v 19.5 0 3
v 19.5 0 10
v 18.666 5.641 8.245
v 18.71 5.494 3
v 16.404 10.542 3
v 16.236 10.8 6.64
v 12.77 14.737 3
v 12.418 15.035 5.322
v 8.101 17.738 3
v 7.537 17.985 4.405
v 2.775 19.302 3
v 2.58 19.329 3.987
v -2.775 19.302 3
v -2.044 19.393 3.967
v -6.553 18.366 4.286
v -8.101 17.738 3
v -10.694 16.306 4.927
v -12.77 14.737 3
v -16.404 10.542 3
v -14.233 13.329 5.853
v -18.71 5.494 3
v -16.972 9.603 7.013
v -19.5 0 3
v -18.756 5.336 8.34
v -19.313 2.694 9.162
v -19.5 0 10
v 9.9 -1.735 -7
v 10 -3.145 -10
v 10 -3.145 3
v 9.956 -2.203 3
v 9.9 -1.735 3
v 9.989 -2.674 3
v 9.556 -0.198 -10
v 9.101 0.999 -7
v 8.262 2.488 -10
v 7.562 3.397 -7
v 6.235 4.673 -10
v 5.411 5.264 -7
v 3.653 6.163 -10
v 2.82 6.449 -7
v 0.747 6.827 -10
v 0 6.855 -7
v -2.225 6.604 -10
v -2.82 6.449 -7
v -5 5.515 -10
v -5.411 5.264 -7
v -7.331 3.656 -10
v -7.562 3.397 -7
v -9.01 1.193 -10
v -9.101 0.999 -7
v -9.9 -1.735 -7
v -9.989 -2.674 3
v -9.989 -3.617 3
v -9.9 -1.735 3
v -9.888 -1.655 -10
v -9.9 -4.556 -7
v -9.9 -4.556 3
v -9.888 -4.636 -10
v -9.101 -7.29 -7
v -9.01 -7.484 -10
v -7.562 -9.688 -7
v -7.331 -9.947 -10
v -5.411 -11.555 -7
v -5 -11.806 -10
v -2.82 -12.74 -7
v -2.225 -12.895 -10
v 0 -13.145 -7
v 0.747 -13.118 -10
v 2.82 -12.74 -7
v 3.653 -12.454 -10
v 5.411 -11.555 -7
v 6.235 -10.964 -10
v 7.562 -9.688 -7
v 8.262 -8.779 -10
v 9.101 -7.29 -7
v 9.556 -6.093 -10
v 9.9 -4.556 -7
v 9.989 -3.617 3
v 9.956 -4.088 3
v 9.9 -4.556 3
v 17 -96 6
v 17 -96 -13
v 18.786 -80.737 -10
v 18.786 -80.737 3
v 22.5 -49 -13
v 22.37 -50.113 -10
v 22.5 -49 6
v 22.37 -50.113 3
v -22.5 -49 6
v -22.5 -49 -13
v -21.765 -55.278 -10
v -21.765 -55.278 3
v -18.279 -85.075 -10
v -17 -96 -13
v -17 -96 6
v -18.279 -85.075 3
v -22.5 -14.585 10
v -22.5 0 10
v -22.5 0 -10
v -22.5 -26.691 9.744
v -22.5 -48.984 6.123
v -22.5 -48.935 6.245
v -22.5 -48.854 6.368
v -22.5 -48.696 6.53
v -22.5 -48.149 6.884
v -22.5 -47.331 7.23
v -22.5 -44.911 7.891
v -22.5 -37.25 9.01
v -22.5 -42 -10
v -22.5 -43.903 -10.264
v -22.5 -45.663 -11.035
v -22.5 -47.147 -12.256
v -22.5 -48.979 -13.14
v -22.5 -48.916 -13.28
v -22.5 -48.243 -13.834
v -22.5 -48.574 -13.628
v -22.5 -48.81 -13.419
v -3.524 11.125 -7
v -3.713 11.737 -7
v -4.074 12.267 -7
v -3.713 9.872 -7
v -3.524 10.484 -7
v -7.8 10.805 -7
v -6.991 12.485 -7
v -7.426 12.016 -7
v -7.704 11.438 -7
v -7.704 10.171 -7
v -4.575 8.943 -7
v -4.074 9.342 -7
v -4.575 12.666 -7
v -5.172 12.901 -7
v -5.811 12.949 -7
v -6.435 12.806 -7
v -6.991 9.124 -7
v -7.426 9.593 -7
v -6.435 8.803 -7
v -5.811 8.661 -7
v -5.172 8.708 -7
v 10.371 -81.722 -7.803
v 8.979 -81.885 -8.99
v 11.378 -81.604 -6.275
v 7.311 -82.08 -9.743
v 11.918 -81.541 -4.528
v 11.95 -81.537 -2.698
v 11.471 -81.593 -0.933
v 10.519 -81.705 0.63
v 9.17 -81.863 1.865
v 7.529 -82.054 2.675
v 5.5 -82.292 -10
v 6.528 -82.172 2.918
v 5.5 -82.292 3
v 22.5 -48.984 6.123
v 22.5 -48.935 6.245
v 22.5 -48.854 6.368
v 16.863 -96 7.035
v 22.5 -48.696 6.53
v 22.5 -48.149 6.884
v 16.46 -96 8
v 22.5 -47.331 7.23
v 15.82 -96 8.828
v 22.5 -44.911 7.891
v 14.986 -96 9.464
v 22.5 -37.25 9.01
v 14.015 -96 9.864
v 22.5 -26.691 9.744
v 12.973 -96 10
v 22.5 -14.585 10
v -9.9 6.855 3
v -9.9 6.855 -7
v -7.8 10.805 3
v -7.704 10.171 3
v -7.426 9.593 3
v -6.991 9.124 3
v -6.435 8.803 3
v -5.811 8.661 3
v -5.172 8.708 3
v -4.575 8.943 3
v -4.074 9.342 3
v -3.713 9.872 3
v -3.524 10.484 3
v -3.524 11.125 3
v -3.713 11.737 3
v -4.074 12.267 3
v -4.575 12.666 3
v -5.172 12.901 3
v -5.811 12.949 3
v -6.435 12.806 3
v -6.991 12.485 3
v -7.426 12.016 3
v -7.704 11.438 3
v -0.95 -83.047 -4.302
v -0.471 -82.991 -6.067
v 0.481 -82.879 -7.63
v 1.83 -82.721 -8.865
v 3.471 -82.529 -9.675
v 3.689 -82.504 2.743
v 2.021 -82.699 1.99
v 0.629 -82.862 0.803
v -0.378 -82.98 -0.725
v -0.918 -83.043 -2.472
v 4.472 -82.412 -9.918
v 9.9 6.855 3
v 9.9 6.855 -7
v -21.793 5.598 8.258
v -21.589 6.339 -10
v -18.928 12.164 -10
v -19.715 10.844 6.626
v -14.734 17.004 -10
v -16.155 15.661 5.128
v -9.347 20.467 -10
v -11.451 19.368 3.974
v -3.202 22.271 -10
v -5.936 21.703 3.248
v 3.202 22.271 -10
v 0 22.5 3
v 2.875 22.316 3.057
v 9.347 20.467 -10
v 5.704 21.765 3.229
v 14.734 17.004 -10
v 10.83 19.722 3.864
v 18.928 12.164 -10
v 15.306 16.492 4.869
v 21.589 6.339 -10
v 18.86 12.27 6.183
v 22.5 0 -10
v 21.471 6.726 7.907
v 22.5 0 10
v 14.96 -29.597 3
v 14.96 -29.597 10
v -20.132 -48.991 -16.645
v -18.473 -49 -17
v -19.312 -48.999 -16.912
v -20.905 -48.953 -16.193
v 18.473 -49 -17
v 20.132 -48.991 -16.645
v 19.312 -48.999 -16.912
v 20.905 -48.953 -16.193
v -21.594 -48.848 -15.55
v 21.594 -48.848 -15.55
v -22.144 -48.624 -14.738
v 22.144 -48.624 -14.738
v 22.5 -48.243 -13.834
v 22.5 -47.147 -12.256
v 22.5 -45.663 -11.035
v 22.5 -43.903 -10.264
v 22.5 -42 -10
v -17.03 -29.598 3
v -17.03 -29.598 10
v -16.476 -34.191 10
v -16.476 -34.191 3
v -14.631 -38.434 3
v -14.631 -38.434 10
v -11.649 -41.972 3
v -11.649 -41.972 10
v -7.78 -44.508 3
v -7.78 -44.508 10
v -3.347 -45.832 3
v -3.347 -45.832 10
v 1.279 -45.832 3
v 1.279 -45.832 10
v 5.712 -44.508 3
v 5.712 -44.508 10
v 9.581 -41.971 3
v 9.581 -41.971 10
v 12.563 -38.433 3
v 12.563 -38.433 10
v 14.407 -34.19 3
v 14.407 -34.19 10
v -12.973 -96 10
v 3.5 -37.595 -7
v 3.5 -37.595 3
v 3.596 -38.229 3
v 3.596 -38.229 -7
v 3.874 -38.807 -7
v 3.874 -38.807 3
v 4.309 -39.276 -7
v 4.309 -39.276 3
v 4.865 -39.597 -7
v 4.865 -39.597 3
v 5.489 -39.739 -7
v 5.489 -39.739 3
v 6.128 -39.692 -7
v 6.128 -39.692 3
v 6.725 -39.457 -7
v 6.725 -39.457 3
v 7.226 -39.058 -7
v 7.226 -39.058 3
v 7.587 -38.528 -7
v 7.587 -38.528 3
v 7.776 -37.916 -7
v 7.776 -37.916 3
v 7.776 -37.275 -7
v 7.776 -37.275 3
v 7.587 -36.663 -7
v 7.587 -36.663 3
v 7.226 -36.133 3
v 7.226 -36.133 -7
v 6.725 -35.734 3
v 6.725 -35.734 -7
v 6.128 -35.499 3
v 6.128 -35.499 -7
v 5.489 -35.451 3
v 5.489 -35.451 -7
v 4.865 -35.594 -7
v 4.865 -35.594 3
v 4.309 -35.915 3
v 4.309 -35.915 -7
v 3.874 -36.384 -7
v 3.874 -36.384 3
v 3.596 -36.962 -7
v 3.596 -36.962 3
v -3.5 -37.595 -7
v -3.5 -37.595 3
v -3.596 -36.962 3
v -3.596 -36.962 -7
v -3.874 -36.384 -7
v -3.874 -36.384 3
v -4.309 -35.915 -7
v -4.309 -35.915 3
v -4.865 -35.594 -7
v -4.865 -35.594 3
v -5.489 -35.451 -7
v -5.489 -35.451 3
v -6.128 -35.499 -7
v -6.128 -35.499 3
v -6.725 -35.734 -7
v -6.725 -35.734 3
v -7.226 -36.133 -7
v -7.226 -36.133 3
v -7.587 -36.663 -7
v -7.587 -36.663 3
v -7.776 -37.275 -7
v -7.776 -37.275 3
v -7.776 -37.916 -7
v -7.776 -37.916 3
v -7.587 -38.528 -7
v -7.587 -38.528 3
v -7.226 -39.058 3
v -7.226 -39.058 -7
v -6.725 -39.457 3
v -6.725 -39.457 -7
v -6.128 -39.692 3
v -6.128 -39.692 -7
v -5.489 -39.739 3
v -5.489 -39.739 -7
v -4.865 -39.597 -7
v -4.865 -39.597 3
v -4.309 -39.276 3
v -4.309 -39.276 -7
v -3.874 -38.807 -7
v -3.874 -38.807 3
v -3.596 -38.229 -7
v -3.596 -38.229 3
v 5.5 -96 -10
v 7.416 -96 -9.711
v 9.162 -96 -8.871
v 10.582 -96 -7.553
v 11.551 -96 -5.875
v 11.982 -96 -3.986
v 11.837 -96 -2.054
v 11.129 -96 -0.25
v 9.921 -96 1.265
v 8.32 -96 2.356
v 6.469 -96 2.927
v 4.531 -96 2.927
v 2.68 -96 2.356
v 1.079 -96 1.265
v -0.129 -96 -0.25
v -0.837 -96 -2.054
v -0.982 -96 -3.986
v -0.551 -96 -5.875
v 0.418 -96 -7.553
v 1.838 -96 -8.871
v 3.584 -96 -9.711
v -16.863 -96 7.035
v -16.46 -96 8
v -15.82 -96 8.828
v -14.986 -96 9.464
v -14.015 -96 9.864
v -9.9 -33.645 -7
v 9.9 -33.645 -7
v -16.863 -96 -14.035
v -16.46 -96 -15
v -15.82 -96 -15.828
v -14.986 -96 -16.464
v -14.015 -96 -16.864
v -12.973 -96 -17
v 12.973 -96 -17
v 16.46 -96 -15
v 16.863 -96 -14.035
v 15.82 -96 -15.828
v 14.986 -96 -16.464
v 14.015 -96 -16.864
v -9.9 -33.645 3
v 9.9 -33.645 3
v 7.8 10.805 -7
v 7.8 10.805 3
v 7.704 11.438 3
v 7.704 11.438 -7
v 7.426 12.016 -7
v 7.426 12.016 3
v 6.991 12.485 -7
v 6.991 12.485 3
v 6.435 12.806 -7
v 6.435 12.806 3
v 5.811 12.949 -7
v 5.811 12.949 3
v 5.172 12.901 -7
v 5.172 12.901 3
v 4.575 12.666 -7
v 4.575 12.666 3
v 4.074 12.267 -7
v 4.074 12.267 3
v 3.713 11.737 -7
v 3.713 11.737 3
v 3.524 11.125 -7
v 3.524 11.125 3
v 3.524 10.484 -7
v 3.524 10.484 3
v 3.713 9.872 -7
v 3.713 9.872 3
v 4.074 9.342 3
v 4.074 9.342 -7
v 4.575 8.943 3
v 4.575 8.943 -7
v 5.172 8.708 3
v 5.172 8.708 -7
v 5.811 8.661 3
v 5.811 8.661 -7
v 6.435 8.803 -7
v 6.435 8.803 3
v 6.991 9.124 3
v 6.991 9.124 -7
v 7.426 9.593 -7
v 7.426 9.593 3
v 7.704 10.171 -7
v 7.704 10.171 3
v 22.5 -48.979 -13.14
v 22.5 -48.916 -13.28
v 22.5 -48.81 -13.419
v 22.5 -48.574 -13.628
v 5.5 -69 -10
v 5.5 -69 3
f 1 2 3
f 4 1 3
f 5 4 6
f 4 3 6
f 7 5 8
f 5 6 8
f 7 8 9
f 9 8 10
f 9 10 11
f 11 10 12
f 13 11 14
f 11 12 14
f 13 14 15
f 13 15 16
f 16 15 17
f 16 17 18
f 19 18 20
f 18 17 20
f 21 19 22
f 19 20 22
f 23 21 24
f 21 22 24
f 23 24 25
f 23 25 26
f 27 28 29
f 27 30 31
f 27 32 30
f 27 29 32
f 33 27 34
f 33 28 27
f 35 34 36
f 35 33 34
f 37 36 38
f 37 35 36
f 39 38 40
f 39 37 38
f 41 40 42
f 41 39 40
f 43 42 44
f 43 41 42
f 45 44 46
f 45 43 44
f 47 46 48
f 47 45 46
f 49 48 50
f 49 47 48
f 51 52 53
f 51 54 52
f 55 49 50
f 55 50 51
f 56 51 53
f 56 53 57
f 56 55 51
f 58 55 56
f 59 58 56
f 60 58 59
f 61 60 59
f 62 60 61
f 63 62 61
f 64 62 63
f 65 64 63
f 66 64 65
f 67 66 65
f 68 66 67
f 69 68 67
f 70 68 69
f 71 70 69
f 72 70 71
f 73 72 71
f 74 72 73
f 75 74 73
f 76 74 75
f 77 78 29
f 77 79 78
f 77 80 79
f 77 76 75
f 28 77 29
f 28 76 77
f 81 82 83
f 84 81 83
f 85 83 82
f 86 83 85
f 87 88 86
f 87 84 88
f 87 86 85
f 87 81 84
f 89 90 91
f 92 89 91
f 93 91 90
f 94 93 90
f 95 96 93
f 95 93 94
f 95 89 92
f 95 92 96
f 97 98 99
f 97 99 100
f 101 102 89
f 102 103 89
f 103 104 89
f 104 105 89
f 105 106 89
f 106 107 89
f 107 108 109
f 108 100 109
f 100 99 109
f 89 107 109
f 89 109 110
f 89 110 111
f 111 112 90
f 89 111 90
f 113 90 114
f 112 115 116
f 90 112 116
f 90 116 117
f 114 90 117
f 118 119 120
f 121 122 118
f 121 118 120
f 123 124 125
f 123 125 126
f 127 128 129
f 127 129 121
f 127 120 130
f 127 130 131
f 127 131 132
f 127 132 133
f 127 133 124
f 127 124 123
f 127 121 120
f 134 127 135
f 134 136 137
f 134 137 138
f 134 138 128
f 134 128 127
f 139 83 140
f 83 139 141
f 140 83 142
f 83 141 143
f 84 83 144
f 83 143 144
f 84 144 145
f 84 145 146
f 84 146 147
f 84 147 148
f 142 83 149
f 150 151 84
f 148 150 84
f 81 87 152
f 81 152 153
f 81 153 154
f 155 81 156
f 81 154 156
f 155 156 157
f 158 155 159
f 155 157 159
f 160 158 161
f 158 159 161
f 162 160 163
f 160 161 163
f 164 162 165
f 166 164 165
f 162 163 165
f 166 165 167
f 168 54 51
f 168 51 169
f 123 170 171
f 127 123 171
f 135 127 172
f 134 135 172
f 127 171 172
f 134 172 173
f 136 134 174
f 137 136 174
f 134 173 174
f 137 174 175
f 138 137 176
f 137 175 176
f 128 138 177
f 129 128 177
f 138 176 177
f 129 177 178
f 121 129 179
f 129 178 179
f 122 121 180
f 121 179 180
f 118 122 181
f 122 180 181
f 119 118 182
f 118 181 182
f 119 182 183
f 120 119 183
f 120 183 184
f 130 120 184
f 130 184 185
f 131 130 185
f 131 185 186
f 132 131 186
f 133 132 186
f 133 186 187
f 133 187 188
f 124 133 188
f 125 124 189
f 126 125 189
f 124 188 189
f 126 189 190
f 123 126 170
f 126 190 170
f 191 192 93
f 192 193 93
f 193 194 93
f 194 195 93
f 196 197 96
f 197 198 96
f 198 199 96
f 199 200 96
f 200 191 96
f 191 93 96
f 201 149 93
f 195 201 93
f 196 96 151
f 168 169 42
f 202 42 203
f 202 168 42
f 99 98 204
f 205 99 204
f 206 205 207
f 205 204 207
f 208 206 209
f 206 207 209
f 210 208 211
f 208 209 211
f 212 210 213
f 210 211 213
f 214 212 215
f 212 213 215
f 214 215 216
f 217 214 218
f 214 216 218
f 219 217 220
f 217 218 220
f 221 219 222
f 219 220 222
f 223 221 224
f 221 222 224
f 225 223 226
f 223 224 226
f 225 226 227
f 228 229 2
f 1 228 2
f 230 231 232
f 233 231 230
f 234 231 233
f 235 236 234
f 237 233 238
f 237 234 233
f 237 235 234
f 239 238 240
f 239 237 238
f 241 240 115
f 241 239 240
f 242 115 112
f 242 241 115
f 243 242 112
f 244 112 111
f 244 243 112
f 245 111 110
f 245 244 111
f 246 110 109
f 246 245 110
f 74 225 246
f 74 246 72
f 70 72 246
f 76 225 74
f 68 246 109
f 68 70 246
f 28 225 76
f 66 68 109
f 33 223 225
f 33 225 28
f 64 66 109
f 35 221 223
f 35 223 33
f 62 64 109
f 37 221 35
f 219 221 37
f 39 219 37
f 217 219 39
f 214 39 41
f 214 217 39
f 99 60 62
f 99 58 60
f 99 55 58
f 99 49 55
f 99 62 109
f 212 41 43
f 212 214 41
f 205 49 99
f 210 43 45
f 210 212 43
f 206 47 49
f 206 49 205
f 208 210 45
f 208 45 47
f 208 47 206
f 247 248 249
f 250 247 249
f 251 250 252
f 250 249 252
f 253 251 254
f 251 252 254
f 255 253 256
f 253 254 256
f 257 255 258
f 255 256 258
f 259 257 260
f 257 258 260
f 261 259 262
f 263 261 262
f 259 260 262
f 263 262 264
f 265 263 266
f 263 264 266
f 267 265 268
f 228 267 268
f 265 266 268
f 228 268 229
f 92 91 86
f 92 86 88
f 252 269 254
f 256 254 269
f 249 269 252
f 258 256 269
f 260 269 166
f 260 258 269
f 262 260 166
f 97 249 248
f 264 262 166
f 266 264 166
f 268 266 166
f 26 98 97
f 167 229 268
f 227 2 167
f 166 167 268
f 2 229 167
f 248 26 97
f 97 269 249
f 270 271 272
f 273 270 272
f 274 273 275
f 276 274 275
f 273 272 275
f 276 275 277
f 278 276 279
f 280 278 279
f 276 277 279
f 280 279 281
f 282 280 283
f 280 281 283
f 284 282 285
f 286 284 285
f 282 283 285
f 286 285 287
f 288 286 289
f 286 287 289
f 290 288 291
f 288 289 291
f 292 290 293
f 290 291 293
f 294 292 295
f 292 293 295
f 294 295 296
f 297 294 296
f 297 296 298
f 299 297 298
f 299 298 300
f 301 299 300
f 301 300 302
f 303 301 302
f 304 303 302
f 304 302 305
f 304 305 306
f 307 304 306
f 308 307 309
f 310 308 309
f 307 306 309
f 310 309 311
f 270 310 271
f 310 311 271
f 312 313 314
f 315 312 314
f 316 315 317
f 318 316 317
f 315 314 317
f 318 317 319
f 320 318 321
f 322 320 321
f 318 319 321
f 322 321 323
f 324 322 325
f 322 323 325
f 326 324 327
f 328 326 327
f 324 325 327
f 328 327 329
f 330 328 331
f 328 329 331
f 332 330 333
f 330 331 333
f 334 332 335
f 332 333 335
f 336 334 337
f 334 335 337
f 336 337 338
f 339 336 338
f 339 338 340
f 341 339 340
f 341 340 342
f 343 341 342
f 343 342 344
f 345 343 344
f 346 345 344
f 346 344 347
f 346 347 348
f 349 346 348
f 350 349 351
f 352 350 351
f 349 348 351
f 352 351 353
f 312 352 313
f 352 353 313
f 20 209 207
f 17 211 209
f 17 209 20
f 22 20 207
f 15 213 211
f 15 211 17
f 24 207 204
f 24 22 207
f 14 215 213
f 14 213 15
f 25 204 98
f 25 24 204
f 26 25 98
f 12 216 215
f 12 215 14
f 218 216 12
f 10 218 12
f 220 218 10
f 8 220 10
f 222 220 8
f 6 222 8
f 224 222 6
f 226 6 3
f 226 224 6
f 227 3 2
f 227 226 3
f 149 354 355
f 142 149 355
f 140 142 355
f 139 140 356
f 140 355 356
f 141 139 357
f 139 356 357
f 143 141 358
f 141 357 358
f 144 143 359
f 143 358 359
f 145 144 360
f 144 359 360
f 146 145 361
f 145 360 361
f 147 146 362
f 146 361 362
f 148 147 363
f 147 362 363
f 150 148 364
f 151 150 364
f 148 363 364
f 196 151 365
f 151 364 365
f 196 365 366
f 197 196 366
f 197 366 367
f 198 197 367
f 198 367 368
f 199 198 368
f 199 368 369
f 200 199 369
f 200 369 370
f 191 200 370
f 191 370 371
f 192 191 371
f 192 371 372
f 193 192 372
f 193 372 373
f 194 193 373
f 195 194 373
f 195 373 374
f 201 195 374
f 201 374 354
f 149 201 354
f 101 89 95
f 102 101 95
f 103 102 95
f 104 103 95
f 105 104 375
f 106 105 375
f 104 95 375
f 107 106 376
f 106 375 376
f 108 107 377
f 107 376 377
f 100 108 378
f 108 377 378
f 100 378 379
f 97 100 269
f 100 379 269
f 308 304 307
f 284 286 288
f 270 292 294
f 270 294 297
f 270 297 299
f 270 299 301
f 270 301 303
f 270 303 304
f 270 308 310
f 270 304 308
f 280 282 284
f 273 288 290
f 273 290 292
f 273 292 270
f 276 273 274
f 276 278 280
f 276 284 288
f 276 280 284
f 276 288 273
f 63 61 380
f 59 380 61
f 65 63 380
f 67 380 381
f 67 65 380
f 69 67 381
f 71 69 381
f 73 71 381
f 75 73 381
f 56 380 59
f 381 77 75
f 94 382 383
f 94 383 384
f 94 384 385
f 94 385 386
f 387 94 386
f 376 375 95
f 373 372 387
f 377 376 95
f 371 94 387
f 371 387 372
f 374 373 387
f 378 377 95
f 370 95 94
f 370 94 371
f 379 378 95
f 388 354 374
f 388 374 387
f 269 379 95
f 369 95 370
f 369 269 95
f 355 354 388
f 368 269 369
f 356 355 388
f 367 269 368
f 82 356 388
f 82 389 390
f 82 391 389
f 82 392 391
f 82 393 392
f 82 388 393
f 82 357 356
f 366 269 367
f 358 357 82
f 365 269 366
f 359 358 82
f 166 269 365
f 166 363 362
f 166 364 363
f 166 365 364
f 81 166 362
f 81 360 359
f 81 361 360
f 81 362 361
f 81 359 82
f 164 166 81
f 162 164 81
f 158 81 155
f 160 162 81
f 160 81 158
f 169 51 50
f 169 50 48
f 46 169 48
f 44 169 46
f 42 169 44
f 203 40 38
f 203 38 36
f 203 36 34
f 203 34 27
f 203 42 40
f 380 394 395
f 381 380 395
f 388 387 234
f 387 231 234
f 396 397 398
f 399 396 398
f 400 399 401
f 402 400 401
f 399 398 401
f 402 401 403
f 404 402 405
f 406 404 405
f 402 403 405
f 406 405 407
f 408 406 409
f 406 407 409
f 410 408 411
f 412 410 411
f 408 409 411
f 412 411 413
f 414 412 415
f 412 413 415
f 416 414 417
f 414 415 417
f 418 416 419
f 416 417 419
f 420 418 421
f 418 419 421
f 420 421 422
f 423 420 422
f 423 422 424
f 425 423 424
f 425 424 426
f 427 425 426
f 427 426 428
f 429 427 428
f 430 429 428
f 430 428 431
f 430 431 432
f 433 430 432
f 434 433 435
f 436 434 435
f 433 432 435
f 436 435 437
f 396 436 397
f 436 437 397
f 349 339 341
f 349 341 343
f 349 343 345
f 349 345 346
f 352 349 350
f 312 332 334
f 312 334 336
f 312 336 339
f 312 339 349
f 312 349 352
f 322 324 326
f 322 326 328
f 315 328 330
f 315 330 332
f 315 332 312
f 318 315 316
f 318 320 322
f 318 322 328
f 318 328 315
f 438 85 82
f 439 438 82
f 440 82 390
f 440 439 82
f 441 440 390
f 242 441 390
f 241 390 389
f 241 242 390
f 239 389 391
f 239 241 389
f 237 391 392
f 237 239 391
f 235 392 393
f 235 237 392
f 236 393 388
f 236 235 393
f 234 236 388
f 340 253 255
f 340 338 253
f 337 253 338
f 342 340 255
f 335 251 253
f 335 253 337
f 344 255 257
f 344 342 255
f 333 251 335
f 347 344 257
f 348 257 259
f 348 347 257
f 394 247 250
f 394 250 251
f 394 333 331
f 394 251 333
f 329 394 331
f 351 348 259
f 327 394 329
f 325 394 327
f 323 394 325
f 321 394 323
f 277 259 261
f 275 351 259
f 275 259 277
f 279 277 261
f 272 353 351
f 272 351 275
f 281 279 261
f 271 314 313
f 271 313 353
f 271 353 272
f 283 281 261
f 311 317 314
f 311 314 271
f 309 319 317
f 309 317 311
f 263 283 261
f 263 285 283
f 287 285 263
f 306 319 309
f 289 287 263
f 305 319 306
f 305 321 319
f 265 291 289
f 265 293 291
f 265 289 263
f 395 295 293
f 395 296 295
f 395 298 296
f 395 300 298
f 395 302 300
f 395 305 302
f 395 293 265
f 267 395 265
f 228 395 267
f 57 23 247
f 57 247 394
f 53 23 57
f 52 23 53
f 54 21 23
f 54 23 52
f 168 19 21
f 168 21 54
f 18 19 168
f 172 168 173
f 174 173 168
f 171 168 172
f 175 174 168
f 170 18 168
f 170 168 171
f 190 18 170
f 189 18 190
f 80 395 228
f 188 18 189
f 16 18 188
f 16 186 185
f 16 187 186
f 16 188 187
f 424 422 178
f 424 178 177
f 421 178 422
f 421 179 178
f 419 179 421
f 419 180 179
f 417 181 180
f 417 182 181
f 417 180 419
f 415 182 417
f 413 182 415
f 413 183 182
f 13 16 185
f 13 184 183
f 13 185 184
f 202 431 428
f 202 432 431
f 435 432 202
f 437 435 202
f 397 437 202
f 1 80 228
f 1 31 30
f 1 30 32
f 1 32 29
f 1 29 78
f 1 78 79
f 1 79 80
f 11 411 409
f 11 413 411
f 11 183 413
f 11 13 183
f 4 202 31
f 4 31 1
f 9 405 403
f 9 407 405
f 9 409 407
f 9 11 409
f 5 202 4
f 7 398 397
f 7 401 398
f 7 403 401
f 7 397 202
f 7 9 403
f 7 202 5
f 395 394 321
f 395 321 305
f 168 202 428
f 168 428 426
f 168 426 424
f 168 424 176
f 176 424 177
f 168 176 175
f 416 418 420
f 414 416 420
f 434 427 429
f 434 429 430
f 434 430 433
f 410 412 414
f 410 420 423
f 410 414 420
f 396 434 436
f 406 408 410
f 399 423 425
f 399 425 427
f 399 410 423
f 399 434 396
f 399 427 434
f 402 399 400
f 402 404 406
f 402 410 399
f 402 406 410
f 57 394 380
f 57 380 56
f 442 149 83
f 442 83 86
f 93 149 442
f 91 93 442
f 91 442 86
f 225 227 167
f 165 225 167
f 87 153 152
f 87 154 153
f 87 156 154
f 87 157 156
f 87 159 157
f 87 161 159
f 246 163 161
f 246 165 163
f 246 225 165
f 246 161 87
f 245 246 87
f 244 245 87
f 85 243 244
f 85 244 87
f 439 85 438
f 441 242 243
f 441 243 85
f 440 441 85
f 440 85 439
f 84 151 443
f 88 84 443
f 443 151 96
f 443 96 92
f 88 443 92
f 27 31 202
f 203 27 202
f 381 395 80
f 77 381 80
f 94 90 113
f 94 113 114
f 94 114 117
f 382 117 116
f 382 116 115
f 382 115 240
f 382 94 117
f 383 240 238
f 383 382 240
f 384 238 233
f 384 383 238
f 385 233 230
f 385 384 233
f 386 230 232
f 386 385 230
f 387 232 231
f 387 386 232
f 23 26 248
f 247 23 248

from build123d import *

# Parameters (mm, degrees)
BOSS_EXTRUDE1_DEPTH     = 10
CUT_EXTRUDE1_DEPTH      = 7
CUT_EXTRUDE3_DEPTH      = 55.838398955
CUT_EXTRUDE3_DEPTH_BACK = 55.838398955
BOSS_EXTRUDE2_DEPTH     = 27
SKETCH6_W               = 13
SKETCH6_H               = 30
CUT_EXTRUDE4_DEPTH      = 107.88879918
FILLET1_R               = 7
FILLET2_R               = 4
SKETCH8_R               = 6.5
CUT_EXTRUDE5_DEPTH      = 27
SKETCH11_R              = 2.15
SKETCH11_W              = 19.8
SKETCH11_H              = 40.5
CUT_EXTRUDE7_DEPTH      = 10
CUT_EXTRUDE8_DEPTH      = 101.056234307
CUT_EXTRUDE8_DEPTH_BACK = 101.056234307
SKETCH12_R              = 10


with BuildPart() as part:
    # Sketch1 → Boss-Extrude1 (new, symmetric)
    with BuildSketch(Plane.XY):
        with BuildLine():
            Line((22.5, 0), (22.5, -49))
            Line((22.5, -49), (-22.5, -49))
            Line((-22.5, -49), (-22.5, 0))
            ThreePointArc((-22.5, 0), (0, 22.5), (22.5, 0))
        make_face()
    extrude(amount=BOSS_EXTRUDE1_DEPTH, both=True)

    # Sketch2 → Cut-Extrude1 (cut)
    with BuildSketch(Plane.XY.offset(10)):
        with BuildLine():
            Line((-19.5, 0), (-17.029582922, -29.598102078))
            ThreePointArc((-17.029582922, -29.598102078), (-1.033858787, -46), (14.96028148, -29.596557582))
            Line((14.96028148, -29.596557582), (19.5, 0))
            ThreePointArc((19.5, 0), (0, 19.5), (-19.5, 0))
        make_face()
    extrude(amount=-CUT_EXTRUDE1_DEPTH, mode=Mode.SUBTRACT)

    # Sketch4 → Cut-Extrude3 (cut, two sides: drawn at the far end of the back side and taken through both)
    with BuildSketch(Plane.ZY.offset(-CUT_EXTRUDE3_DEPTH_BACK)):
        Polygon((10, 0), (10, 22.5), (3, 22.5), align=None)
    extrude(amount=CUT_EXTRUDE3_DEPTH + CUT_EXTRUDE3_DEPTH_BACK, mode=Mode.SUBTRACT)

    # Sketch5 → Boss-Extrude2 (add)
    with BuildSketch(Plane.XY.offset(10)):
        Polygon((-17, -96), (17, -96), (22.5, -49), (-22.5, -49), align=None)
    extrude(amount=-BOSS_EXTRUDE2_DEPTH)

    # Sketch6 → Cut-Extrude4 (cut, through all)
    with BuildSketch(Plane(origin=(-27.852629229, -3.259350229, 0), x_dir=(0, 0, 1), z_dir=(-0.9932225393212899, -0.11622816949504453, 0))):
        with Locations((-3.5, -67.373484893)):
            Rectangle(SKETCH6_W, SKETCH6_H)
    extrude(amount=-CUT_EXTRUDE4_DEPTH, mode=Mode.SUBTRACT)

    # Fillet1
    # the kernel refuses this fillet: 7 mm, written as the material it adds along each edge
    with BuildSketch(Plane(origin=(22.5, -49, -10), x_dir=(0, 1, 0), z_dir=(-1, 0, 0))) as fillet1_piece_1_section:
        with BuildLine():
            CenterArc((FILLET1_R, FILLET1_R), FILLET1_R, 180, 90)
            Line((0, FILLET1_R), (0, 0))
            Line((0, 0), (FILLET1_R, 0))
        make_face()
    fillet1_piece_1 = extrude(amount=45, mode=Mode.PRIVATE)
    fillet1_piece_1 = split(fillet1_piece_1, bisect_by=Plane(origin=(22.378999484, -50.034004412, -11.584712056), z_dir=(-0.9932225393212899, 0.11622816949504457, 0)), keep=Keep.TOP, mode=Mode.PRIVATE)
    fillet1_piece_1 = split(fillet1_piece_1, bisect_by=Plane(origin=(-22.378999484, -50.034004412, -11.584712056), z_dir=(0.9932225393212899, 0.11622816949504457, 0)), keep=Keep.TOP, mode=Mode.PRIVATE)
    add(fillet1_piece_1)

    # Fillet2
    fillet2_edges = [part.edges().sort_by_distance(p)[0] for p in [
        (19.75, -72.5, -17),
        (-19.75, -72.5, -17),
        (-19.75, -72.5, 10),
        (19.75, -72.5, 10),
    ]]
    fillet(fillet2_edges, radius=FILLET2_R)

    # Sketch8 → Cut-Extrude5 (cut)
    with BuildSketch(Plane.XZ.offset(96)):
        with Locations(Location((5.5, -3.5, 0), (0, 0, 270))):
            Circle(SKETCH8_R)
    extrude(amount=-CUT_EXTRUDE5_DEPTH, mode=Mode.SUBTRACT)

    # Sketch11 → Cut-Extrude7 (cut)
    with BuildSketch(Plane.XY.offset(3)):
        with Locations((5.65, 10.804521868)):
            Circle(SKETCH11_R)
        with Locations(Location((-5.65, 10.804521868, 0), (0, 0, 180))):
            Circle(SKETCH11_R)
        with Locations(Location((5.65, -37.595478132, 0), (0, 0, 180))):
            Circle(SKETCH11_R)
        with Locations((-5.65, -37.595478132)):
            Circle(SKETCH11_R)
        with Locations((0, -13.395478132)):
            Rectangle(SKETCH11_W, SKETCH11_H)
    extrude(amount=-CUT_EXTRUDE7_DEPTH, mode=Mode.SUBTRACT)

    # Sketch12 → Cut-Extrude8 (cut, two sides: drawn at the far end of the back side and taken through both)
    with BuildSketch(Plane.XY.offset(-7).offset(-CUT_EXTRUDE8_DEPTH_BACK)):
        with Locations((0, -3.145478132)):
            Circle(SKETCH12_R)
    extrude(amount=CUT_EXTRUDE8_DEPTH + CUT_EXTRUDE8_DEPTH_BACK, mode=Mode.SUBTRACT)


solid = part.part
